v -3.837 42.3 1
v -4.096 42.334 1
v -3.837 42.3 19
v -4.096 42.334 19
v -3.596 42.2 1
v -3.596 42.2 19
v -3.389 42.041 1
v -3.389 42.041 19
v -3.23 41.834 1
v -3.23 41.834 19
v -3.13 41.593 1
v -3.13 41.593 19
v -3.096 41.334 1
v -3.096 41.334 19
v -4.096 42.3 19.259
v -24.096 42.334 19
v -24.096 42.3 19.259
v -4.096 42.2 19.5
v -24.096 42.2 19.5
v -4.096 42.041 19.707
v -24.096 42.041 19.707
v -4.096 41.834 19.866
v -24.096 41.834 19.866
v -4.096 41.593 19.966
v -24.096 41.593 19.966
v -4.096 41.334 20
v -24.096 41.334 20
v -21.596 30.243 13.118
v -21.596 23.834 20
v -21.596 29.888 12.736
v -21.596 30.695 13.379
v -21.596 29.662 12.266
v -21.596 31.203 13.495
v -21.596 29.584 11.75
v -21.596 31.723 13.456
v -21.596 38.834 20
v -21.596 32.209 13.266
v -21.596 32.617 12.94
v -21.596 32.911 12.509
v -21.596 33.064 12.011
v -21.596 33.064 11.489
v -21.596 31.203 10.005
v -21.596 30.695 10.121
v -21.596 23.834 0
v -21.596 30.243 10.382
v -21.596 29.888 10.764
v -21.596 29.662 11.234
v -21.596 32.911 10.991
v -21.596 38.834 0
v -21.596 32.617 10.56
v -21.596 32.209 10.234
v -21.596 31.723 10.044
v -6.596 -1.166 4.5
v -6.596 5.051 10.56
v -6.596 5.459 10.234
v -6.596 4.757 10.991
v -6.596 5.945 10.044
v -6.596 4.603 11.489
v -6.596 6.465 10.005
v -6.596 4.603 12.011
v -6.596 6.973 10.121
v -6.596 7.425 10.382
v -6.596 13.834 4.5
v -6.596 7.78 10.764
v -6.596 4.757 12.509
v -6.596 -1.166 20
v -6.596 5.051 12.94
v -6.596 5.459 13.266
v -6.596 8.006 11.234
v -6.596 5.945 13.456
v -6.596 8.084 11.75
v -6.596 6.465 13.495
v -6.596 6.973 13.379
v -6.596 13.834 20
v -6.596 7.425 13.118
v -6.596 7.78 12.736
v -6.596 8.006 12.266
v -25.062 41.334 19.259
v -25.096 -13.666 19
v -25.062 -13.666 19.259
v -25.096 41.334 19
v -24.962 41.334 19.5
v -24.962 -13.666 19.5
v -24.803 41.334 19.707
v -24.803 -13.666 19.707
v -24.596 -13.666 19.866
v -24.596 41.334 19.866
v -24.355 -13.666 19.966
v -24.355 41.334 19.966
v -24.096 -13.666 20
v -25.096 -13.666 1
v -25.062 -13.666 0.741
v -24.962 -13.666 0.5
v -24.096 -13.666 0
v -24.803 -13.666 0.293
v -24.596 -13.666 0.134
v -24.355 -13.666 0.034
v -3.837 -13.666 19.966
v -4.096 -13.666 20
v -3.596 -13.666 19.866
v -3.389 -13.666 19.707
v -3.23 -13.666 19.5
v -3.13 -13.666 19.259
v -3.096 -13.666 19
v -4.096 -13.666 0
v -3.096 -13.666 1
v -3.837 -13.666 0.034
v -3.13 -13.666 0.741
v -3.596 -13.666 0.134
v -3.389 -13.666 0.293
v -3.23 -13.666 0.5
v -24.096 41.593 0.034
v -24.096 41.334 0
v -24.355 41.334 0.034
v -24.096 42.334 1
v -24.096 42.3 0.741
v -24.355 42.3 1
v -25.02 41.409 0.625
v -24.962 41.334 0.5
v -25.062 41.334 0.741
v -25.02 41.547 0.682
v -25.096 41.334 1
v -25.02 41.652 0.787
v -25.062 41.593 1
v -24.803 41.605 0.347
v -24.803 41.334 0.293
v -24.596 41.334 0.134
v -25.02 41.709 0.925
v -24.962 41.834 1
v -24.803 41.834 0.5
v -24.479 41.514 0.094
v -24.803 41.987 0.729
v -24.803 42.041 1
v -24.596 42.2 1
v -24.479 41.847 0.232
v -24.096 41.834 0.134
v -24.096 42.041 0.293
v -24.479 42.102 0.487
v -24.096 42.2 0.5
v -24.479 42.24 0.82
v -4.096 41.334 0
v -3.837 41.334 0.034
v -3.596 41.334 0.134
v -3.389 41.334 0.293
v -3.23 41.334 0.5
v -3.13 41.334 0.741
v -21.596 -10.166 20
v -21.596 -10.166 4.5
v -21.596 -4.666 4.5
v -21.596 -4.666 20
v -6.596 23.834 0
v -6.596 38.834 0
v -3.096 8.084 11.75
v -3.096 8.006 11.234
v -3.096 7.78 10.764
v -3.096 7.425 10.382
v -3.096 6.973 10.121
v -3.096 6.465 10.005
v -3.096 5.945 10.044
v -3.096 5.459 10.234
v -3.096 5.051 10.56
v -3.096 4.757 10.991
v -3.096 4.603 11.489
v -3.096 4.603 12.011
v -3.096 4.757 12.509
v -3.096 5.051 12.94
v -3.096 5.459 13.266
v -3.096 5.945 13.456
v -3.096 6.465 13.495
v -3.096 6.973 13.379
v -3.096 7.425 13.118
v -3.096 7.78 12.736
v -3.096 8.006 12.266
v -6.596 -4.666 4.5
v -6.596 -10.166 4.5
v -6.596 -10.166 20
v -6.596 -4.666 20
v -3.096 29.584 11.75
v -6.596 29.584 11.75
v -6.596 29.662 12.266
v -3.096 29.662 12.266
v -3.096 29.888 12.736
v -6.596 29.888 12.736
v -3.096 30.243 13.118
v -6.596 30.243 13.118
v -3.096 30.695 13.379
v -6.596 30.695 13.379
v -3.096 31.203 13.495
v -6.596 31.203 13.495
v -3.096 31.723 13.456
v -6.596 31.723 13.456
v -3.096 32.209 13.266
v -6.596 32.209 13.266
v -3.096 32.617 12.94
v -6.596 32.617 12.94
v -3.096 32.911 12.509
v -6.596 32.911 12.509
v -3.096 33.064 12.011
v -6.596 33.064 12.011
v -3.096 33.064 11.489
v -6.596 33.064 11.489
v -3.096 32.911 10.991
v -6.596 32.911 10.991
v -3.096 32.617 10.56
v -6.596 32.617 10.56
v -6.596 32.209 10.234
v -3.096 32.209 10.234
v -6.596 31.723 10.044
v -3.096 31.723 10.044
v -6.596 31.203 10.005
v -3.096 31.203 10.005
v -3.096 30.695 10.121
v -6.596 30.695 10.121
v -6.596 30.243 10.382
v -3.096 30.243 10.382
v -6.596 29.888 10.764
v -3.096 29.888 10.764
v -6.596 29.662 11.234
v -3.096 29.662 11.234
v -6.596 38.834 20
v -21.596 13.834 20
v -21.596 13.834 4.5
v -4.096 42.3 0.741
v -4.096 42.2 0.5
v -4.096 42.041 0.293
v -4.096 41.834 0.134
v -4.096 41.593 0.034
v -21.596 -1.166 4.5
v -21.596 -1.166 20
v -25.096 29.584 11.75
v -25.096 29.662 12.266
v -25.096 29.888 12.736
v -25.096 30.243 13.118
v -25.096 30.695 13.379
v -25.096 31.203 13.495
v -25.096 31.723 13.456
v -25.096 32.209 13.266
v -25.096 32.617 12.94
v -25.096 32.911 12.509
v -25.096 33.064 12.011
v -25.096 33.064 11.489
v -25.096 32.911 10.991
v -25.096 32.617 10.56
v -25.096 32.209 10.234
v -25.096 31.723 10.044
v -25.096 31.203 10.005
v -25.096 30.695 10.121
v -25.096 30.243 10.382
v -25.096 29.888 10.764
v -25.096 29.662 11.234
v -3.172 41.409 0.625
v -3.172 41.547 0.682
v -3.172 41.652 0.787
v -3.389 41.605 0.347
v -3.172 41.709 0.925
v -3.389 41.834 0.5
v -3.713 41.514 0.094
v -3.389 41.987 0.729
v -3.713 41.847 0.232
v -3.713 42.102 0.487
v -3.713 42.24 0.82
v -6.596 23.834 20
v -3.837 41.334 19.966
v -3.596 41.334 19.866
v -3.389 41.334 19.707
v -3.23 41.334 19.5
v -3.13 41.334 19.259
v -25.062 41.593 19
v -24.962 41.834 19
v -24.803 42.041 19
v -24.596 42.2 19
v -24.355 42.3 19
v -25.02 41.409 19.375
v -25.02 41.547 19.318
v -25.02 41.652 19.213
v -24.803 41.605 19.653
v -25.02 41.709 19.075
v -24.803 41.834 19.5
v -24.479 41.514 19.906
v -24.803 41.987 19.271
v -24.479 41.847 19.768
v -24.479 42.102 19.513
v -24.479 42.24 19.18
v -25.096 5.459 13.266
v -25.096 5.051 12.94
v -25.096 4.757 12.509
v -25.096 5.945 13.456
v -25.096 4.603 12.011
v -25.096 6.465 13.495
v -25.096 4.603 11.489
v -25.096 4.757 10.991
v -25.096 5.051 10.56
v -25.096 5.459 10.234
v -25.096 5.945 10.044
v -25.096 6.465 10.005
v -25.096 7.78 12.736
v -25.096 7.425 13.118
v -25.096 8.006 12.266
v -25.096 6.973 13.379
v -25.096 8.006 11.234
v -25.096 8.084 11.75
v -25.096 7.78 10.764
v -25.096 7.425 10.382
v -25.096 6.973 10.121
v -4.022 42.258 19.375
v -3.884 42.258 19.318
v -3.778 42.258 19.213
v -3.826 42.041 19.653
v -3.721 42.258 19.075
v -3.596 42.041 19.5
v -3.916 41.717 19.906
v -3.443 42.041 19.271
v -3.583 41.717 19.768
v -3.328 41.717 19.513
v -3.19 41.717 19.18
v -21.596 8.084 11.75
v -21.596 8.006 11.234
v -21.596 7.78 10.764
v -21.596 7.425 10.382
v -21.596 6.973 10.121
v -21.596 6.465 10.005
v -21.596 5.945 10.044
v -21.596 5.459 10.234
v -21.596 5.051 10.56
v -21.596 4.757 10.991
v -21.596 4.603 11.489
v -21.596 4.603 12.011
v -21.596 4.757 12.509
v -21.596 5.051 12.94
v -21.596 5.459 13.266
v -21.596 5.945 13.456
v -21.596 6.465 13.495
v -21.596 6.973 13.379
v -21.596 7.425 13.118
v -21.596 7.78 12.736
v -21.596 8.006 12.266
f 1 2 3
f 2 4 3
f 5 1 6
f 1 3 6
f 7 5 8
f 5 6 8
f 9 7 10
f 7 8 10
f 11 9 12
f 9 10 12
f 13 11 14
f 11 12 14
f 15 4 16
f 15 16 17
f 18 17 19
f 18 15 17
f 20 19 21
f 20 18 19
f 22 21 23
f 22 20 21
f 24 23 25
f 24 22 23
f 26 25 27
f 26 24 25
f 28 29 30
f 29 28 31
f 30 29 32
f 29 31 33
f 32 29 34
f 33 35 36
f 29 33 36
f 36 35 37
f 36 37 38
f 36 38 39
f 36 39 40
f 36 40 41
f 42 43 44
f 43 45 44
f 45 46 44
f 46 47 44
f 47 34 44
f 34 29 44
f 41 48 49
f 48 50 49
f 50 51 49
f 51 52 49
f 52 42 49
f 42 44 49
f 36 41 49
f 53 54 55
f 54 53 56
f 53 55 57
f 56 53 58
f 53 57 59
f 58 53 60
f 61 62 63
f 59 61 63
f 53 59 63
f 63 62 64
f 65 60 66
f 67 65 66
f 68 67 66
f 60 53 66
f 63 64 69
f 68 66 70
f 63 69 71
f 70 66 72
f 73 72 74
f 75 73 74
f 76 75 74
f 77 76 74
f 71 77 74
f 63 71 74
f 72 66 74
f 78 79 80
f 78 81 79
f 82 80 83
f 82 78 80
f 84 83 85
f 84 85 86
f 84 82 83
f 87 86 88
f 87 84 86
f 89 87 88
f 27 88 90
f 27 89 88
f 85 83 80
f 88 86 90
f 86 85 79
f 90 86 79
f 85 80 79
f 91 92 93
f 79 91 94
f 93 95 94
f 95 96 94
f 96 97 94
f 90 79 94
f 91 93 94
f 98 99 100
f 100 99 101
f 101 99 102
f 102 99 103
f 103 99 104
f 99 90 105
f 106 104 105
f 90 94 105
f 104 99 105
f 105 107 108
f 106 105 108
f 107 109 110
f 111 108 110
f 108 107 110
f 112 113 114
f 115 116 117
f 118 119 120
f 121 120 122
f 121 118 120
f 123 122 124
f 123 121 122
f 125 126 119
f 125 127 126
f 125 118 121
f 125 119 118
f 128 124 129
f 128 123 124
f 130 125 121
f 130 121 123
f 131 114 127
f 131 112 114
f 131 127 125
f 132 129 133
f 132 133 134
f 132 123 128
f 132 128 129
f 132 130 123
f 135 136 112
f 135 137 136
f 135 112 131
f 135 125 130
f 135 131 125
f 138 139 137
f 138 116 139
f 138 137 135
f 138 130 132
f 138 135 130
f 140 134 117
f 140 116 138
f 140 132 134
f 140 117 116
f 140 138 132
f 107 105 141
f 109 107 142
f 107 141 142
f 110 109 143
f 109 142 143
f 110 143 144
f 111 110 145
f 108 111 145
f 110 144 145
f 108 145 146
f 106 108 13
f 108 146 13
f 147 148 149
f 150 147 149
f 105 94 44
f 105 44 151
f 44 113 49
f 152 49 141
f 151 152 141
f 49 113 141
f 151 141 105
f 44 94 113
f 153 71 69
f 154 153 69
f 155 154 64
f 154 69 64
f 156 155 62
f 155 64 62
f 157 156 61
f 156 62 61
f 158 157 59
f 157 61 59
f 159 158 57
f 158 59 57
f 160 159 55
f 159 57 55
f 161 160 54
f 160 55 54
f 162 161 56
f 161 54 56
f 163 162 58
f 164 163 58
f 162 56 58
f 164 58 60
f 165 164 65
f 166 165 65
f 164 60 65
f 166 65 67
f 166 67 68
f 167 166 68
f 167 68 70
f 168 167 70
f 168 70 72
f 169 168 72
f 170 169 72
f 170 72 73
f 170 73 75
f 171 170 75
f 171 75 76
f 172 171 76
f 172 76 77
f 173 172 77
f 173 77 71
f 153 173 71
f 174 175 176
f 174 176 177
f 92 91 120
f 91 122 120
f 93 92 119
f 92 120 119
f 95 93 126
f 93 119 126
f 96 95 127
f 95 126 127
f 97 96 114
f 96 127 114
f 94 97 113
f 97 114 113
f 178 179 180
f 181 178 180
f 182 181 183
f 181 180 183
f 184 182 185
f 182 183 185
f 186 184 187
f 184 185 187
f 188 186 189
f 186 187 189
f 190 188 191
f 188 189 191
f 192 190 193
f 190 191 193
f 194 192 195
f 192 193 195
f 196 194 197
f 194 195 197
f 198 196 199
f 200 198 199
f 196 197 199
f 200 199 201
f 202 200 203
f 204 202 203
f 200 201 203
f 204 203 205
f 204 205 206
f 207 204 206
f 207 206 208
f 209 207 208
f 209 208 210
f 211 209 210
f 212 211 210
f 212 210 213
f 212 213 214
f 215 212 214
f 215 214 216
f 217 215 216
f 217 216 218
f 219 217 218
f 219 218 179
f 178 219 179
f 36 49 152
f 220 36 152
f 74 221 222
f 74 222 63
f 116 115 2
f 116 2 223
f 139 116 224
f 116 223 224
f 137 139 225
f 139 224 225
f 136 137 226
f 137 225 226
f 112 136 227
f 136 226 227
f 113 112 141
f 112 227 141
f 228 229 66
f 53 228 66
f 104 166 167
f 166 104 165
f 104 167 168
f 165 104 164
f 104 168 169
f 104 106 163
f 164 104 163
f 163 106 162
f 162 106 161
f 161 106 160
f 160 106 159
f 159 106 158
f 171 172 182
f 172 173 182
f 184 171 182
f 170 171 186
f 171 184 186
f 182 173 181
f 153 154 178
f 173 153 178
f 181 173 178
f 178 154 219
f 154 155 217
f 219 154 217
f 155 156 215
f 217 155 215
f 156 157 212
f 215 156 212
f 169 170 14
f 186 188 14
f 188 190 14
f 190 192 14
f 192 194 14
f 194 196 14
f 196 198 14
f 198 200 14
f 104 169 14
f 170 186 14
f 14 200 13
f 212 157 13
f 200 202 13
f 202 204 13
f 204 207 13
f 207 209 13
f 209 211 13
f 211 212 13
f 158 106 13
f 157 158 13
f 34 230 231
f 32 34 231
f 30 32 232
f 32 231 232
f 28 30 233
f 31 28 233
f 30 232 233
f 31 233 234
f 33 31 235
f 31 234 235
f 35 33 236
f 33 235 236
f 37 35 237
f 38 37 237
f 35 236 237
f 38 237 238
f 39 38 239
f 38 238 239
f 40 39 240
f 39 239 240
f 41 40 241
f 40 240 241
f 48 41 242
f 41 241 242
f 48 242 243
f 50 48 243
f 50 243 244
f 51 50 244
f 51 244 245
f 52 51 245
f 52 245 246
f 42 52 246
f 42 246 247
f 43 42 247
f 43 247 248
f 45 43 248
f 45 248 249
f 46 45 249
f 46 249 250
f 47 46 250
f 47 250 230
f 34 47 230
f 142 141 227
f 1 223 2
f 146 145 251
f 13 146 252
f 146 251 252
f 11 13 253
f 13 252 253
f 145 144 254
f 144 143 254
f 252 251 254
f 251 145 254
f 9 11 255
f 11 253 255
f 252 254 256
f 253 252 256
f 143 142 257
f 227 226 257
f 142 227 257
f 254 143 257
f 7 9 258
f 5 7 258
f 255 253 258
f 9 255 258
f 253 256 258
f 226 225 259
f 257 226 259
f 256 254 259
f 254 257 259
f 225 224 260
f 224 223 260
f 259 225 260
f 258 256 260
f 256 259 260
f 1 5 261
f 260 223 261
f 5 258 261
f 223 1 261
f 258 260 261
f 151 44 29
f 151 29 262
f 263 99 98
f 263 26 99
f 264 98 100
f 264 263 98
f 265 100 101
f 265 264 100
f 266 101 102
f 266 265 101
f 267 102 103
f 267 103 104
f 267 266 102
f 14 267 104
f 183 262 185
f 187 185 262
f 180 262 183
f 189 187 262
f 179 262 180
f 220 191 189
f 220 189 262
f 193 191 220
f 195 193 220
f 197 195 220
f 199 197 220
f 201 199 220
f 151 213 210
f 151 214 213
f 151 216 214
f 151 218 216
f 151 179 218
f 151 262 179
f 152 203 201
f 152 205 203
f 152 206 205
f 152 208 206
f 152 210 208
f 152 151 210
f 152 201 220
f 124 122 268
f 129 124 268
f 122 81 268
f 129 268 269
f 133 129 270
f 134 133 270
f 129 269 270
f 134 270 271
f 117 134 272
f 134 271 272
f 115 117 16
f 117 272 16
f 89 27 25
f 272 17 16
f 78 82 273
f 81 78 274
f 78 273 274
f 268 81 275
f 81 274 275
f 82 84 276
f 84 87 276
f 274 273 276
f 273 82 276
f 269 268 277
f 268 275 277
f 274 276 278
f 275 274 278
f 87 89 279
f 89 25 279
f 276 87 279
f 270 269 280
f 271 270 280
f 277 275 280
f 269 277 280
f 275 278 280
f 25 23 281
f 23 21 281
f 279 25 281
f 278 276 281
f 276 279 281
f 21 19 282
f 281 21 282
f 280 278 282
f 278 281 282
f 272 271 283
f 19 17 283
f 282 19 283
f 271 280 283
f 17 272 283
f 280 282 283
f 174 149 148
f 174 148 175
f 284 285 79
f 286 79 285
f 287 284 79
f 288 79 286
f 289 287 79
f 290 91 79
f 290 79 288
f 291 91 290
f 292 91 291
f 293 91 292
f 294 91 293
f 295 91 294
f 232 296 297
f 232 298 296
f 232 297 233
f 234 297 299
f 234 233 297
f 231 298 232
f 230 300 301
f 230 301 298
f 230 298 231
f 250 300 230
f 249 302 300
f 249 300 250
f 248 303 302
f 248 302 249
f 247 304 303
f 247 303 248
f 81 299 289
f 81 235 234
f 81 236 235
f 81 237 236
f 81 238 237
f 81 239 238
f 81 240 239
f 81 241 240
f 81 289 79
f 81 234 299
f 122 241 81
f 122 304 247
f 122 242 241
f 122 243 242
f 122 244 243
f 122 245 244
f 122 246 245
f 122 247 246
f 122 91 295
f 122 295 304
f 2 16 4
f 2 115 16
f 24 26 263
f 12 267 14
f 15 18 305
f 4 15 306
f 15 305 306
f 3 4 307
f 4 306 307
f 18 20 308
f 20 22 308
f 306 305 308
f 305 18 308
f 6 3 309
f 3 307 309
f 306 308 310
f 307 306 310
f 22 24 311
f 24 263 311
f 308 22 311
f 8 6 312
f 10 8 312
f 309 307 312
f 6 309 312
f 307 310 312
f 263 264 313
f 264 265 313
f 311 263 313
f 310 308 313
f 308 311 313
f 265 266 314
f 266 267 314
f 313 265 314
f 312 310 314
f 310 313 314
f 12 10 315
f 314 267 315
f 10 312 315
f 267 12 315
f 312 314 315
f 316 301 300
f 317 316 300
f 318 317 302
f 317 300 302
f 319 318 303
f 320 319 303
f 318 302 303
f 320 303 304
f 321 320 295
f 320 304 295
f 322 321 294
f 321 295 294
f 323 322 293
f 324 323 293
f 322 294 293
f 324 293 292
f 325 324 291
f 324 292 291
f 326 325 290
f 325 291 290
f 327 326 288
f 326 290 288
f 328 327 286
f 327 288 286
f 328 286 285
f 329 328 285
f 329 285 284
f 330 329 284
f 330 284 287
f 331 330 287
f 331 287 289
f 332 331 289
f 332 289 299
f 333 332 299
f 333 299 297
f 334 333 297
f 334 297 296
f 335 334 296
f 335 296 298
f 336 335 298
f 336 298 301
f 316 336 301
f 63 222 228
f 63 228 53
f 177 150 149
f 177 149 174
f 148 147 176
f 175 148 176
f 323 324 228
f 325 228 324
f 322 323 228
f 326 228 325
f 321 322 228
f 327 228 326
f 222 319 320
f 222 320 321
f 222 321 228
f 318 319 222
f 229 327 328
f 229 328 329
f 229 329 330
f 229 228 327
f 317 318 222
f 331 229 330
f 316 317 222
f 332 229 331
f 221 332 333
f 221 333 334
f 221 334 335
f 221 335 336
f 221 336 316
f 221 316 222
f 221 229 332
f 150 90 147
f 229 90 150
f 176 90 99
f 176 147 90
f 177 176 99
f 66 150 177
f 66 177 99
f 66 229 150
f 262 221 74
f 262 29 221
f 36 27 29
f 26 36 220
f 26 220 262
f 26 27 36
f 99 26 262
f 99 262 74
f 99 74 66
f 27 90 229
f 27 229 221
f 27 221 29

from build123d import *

# Parameters (mm, degrees)
SKETCH1_W           = 22
SKETCH1_H           = 56
SKETCH1_W_2         = 15
SKETCH1_H_2         = 15
BOSS_EXTRUDE1_DEPTH = 20
SKETCH2_W           = 15
SKETCH2_H           = 15
SKETCH2_H_2         = 5.5
CUT_EXTRUDE1_DEPTH  = 15.5
FILLET1_R           = 1
SKETCH3_R           = 1.75
CUT_EXTRUDE2_DEPTH  = 35


with BuildPart() as part:
    # Sketch1 → Boss-Extrude1 (new body)
    with BuildSketch(Plane.XY):
        with Locations((-14.096172604, 14.333947726)):
            Rectangle(SKETCH1_W, SKETCH1_H)
        with Locations((-14.096172604, 31.333947726)):
            Rectangle(SKETCH1_W_2, SKETCH1_H_2, mode=Mode.SUBTRACT)
    extrude(amount=BOSS_EXTRUDE1_DEPTH)

    # Sketch2 → Cut-Extrude1 (cut)
    with BuildSketch(Plane.XY.offset(20)):
        with Locations((-14.096172604, 6.333947726)):
            Rectangle(SKETCH2_W, SKETCH2_H)
        with Locations((-14.096172604, -7.416052274)):
            Rectangle(SKETCH2_W, SKETCH2_H_2)
    extrude(amount=-CUT_EXTRUDE1_DEPTH, mode=Mode.SUBTRACT)

    # Fillet1
    fillet1_edges = [part.edges().sort_by_distance(p)[0] for p in [
        (-3.096172604, 14.333947726, 20),
        (-14.096172604, 42.333947726, 20),
        (-25.096172604, 14.333947726, 20),
        (-14.096172604, 42.333947726, 0),
        (-3.096172604, 14.333947726, 0),
        (-25.096172604, 14.333947726, 0),
        (-25.096172604, 42.333947726, 10),
        (-3.096172604, 42.333947726, 10),
    ]]
    fillet(fillet1_edges, radius=FILLET1_R)

    # Sketch3 → Cut-Extrude2 (cut)
    with BuildSketch(Plane.ZY.offset(25.096172604)):
        with Locations(Location((11.75, 31.333947726, 0), (0, 0, 270))):
            Circle(SKETCH3_R)
        with Locations(Location((11.75, 6.333947726, 0), (0, 0, 90))):
            Circle(SKETCH3_R)
    extrude(amount=-CUT_EXTRUDE2_DEPTH, mode=Mode.SUBTRACT)


solid = part.part
